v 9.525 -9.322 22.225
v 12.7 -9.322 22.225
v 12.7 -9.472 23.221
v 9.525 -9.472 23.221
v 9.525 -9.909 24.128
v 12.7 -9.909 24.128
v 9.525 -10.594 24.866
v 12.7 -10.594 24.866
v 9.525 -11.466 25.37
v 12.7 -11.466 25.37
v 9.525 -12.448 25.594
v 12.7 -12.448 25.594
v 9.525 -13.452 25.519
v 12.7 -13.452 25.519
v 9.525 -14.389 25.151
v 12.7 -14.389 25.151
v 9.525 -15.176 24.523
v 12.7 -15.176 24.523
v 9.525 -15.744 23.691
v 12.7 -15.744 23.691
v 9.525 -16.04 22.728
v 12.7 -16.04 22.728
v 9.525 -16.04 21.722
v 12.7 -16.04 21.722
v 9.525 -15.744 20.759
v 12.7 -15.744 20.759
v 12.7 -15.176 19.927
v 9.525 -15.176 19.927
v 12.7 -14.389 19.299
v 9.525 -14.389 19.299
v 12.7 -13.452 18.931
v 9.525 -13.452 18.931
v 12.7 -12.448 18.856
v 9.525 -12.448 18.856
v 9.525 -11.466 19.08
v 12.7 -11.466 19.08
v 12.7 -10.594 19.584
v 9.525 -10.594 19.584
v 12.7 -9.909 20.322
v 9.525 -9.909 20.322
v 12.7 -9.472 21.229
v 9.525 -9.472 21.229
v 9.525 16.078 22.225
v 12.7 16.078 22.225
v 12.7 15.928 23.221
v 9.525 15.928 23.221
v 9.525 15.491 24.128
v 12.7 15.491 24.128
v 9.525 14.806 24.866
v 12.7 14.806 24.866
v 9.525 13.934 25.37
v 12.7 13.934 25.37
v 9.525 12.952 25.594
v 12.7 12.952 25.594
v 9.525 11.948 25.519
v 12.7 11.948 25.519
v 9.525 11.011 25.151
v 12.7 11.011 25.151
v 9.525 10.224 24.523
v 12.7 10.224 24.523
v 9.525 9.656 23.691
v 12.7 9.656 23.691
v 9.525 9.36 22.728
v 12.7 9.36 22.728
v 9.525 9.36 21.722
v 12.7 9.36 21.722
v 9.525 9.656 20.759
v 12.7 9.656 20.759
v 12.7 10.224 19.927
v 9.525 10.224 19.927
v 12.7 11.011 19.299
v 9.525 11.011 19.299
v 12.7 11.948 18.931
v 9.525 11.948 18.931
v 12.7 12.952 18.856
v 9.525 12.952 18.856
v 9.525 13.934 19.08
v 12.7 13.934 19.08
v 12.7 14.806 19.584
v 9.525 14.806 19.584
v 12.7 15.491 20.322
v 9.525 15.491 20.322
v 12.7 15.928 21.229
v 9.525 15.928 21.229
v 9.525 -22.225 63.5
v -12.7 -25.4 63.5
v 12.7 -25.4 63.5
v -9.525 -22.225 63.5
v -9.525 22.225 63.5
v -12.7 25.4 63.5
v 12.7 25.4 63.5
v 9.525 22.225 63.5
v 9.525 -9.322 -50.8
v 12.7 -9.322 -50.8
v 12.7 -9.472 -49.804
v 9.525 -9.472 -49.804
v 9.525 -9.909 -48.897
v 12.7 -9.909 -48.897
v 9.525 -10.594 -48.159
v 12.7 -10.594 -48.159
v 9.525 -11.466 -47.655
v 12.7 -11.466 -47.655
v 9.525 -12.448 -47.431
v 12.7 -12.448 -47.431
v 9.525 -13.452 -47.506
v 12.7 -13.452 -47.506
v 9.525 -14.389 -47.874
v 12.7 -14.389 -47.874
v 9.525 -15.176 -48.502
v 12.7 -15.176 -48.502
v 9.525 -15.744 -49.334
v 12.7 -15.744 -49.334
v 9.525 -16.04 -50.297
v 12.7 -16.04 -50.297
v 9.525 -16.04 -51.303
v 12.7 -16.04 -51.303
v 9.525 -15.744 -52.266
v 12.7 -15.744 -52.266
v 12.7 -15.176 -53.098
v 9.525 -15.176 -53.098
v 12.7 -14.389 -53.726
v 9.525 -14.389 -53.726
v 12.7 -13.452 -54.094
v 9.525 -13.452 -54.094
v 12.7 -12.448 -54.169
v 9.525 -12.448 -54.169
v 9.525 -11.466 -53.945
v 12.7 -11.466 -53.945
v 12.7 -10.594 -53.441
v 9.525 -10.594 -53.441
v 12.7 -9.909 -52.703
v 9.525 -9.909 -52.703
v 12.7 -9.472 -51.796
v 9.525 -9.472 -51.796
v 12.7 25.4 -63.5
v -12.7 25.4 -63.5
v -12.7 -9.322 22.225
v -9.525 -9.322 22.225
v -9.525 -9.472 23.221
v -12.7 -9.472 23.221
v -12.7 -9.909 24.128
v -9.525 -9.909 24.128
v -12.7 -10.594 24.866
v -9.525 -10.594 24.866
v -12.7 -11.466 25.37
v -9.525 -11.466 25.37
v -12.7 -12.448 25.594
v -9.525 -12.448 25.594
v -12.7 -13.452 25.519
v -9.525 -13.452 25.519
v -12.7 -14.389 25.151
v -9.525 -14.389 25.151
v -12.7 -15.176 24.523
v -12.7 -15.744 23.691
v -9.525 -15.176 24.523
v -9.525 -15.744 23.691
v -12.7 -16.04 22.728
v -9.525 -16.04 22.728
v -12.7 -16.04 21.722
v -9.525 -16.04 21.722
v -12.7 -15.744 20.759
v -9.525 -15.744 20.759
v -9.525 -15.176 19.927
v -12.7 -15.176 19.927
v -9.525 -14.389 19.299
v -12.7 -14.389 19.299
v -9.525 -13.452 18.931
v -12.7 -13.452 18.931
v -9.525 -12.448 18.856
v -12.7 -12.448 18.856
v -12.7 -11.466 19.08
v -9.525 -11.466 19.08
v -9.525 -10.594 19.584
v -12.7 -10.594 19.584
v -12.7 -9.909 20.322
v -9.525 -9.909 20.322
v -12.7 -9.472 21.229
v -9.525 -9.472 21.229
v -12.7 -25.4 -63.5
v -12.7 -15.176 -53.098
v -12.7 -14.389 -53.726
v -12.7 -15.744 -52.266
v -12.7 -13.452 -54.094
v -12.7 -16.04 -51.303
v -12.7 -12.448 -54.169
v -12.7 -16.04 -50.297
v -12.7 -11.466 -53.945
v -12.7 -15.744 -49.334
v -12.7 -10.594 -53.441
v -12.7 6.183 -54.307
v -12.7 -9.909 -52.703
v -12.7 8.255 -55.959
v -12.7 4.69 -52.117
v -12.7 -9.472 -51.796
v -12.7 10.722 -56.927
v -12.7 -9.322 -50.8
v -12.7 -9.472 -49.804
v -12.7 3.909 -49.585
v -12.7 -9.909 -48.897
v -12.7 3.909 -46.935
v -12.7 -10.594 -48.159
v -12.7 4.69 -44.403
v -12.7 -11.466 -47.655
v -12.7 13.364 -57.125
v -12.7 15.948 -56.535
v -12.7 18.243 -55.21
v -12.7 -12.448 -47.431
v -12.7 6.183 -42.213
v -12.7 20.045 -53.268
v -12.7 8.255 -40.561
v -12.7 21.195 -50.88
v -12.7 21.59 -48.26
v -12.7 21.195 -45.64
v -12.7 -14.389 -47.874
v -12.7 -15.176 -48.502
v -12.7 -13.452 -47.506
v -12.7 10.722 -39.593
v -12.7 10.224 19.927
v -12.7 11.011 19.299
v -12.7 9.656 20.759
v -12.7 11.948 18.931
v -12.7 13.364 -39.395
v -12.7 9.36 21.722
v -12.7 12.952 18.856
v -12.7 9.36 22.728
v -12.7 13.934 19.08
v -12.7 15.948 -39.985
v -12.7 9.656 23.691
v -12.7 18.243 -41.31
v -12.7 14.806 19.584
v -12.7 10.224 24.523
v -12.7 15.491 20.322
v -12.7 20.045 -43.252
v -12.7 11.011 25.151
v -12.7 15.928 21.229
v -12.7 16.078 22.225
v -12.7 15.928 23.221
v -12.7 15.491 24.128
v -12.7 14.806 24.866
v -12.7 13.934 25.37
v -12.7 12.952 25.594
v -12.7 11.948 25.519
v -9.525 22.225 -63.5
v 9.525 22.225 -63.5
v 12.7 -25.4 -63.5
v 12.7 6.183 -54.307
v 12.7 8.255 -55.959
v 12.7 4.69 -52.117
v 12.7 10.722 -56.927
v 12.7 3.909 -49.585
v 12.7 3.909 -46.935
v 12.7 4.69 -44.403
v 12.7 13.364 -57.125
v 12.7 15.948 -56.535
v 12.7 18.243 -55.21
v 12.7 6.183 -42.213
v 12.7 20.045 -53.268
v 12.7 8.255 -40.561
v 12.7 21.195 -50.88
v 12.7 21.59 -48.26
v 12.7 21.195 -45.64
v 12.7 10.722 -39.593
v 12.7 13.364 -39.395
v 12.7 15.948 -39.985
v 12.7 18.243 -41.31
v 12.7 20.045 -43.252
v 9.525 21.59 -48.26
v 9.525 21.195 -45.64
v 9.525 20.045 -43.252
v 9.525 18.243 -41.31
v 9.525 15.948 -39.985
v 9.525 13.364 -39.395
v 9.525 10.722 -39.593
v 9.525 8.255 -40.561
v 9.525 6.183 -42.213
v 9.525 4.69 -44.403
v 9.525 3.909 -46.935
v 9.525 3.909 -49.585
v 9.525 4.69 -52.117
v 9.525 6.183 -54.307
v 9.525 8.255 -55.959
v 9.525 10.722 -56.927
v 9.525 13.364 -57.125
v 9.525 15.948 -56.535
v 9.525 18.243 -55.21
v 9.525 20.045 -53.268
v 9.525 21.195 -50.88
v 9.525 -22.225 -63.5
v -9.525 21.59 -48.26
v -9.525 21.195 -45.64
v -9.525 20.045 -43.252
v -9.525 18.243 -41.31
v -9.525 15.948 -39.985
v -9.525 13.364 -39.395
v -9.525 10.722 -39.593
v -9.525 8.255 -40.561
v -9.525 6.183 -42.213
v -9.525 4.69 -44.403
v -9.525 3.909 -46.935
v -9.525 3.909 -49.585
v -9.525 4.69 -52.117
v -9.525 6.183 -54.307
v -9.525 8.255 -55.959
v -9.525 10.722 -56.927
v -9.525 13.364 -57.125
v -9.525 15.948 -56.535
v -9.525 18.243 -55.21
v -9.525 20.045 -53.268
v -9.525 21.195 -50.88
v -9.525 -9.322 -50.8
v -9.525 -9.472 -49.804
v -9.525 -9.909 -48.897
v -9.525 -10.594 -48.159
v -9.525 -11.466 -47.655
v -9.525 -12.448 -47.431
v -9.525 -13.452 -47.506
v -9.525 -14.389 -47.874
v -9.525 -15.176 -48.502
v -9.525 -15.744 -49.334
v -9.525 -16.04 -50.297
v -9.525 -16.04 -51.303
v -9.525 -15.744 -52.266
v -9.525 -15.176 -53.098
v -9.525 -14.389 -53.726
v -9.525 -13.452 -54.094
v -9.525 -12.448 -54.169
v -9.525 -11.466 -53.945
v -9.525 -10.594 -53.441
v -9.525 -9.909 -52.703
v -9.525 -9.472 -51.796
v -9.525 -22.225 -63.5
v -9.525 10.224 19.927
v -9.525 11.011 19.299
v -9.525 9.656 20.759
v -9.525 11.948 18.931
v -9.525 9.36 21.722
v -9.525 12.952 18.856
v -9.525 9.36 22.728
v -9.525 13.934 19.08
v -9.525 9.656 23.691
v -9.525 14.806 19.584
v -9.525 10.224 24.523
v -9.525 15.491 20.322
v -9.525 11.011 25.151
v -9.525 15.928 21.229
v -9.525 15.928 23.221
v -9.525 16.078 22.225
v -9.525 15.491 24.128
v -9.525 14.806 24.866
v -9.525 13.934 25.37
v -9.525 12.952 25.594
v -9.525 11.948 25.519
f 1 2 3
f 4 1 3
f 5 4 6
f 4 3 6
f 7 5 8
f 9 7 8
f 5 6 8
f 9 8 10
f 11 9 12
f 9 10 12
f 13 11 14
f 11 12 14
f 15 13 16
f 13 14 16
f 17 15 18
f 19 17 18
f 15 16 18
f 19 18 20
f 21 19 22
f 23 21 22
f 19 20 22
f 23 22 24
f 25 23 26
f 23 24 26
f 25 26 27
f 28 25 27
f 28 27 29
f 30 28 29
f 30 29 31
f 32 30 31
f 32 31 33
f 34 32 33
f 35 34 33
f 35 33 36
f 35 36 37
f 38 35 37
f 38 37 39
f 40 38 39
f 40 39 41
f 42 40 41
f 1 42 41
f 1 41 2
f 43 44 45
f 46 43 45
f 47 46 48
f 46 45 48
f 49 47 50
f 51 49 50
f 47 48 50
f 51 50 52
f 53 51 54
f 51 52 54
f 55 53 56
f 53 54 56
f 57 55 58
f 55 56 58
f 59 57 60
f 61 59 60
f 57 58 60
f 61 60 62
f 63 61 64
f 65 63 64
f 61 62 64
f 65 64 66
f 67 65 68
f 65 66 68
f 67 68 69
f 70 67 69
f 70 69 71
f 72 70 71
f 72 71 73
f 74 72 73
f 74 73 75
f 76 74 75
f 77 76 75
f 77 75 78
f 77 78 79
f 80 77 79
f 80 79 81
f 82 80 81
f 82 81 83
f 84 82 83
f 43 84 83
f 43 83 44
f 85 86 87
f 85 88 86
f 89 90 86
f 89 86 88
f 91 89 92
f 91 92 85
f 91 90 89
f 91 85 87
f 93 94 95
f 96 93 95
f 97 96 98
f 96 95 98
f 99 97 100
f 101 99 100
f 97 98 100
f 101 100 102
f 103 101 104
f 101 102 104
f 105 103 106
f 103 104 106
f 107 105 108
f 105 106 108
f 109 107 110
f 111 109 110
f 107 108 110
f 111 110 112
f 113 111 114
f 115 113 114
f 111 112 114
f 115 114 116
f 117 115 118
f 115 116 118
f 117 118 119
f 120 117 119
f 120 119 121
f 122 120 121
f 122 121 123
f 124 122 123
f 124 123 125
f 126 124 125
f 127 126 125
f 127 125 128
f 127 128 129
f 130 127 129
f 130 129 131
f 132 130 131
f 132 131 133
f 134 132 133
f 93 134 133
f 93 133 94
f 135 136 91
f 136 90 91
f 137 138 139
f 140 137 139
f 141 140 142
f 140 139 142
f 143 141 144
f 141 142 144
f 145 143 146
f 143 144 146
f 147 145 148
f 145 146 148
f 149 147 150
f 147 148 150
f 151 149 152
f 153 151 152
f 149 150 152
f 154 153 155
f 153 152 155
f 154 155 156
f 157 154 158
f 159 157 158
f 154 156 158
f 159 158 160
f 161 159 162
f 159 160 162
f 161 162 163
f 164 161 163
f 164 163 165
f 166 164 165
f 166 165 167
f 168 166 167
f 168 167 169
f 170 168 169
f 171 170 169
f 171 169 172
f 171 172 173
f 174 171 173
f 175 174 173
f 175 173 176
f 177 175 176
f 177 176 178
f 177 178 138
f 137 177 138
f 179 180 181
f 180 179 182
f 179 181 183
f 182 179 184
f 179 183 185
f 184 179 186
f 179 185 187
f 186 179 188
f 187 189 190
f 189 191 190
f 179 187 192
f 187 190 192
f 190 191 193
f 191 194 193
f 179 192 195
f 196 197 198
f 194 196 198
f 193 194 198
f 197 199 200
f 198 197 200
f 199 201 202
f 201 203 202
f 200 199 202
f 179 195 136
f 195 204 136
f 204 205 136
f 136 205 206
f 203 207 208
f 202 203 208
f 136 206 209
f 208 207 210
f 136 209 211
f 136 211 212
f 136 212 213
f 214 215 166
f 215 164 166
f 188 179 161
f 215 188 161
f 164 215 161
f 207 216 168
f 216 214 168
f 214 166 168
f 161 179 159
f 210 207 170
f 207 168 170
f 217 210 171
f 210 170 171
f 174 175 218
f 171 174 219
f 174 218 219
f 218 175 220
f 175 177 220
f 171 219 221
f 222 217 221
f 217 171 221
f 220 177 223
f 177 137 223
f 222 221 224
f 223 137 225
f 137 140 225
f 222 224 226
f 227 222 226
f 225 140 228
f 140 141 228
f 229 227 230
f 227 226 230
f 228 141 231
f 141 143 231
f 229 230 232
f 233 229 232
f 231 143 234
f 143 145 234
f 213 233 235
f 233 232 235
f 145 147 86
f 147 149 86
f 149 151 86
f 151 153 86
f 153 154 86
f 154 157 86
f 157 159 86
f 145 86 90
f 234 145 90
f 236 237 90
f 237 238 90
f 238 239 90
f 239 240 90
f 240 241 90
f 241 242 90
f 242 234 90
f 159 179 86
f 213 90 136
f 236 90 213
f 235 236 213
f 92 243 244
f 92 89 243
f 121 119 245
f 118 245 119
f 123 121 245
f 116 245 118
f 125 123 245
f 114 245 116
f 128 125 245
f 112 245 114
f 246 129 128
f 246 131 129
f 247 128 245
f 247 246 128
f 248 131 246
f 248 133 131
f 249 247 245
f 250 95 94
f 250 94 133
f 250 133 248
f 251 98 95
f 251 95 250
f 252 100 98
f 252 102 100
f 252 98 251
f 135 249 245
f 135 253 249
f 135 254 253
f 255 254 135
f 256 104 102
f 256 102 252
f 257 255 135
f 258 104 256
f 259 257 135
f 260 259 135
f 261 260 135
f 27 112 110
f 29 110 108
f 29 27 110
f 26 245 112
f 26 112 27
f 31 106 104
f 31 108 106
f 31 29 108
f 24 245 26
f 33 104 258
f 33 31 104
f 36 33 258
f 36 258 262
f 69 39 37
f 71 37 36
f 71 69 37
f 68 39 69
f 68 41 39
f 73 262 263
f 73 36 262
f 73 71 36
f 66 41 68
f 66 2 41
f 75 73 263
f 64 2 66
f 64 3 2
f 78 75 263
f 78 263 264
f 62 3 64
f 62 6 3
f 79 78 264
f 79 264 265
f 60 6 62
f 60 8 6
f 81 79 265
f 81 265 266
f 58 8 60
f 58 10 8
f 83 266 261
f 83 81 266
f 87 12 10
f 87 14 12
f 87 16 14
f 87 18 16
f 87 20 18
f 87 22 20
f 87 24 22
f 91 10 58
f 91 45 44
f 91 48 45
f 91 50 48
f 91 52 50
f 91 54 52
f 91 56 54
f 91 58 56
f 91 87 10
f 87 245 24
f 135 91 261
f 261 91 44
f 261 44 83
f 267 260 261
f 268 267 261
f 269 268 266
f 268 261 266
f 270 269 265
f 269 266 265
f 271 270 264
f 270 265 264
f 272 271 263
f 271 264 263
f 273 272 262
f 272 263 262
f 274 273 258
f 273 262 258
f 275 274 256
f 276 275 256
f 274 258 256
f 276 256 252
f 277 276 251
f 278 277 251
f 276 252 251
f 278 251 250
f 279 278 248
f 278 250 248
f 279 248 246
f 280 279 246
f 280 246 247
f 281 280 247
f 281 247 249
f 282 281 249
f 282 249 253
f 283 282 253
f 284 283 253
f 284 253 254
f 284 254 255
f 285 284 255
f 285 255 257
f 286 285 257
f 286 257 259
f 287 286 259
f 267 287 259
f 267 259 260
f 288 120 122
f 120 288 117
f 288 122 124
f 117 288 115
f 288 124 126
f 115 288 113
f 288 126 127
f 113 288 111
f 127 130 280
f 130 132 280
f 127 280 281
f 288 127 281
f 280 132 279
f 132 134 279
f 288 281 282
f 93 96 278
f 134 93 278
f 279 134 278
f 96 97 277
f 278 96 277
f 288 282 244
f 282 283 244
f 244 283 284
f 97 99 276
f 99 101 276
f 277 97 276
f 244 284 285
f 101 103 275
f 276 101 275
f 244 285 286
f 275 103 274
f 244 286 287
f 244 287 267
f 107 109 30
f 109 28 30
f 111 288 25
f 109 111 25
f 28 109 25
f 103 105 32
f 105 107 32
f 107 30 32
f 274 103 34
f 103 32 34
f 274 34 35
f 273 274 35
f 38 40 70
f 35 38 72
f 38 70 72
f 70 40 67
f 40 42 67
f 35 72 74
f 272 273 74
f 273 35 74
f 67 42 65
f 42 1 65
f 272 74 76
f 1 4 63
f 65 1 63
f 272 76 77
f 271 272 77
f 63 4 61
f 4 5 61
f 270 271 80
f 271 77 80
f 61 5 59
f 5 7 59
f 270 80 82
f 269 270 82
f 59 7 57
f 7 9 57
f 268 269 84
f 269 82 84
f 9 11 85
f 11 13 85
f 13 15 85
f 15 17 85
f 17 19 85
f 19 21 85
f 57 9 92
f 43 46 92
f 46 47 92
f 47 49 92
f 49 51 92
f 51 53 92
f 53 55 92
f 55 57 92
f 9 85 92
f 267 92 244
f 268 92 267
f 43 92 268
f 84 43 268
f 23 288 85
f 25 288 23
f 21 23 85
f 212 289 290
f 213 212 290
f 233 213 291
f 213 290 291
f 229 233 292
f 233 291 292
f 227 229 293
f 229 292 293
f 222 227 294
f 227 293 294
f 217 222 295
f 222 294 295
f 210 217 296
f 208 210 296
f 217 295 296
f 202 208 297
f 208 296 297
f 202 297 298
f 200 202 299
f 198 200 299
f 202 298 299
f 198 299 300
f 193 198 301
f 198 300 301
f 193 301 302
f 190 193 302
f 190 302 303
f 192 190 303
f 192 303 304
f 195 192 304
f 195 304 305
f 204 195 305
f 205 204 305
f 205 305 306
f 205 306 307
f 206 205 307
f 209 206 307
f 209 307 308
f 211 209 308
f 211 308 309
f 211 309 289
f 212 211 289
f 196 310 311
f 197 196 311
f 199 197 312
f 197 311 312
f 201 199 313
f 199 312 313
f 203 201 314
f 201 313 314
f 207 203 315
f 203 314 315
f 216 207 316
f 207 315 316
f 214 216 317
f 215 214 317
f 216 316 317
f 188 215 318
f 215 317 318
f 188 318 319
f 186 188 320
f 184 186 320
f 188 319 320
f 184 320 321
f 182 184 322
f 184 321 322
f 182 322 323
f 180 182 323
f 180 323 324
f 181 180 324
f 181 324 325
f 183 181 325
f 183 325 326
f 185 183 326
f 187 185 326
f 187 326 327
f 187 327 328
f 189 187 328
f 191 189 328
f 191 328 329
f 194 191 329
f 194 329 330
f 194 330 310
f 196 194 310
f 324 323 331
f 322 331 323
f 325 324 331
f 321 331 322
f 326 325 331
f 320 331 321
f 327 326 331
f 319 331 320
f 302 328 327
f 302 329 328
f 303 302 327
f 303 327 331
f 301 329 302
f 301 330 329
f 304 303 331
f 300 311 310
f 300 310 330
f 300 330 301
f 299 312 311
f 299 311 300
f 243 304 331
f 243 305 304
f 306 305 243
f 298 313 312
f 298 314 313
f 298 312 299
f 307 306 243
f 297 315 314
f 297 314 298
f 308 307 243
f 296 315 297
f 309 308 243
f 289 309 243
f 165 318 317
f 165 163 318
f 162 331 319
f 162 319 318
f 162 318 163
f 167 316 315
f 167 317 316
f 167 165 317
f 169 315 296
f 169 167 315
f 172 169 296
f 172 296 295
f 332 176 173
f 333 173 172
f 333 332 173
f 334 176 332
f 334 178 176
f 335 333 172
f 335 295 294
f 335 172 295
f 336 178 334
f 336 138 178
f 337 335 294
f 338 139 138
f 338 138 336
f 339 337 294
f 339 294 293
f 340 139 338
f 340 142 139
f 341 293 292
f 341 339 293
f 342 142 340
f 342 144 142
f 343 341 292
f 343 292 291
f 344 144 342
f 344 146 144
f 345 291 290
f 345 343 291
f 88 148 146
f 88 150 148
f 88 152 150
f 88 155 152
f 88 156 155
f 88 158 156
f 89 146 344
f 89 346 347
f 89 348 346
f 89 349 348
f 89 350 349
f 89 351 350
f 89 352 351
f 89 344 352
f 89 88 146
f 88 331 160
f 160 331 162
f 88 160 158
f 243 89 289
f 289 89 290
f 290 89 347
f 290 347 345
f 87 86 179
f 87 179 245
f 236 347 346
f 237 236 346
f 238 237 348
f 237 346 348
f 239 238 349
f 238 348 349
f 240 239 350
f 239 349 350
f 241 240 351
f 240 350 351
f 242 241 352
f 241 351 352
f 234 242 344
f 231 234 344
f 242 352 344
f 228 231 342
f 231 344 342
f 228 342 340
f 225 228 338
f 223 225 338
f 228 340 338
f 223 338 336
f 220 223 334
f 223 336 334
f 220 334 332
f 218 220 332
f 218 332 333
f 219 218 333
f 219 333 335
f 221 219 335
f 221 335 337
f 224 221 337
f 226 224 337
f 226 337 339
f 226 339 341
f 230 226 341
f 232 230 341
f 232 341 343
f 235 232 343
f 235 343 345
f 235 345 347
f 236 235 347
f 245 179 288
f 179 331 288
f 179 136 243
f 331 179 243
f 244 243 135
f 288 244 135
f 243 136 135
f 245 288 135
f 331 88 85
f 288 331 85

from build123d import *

# Parameters (mm, degrees)
SKETCH1_W           = 25.4
SKETCH1_H           = 50.8
SKETCH1_W_2         = 19.05
SKETCH1_H_2         = 44.45
BOSS_EXTRUDE1_DEPTH = 63.5
SKETCH2_R           = 3.3782
CUT_EXTRUDE3_DEPTH  = 73.955945611
SKETCH3_R           = 8.89
CUT_EXTRUDE4_DEPTH  = 73.955945611


with BuildPart() as part:
    # Sketch1 → Boss-Extrude1 (new, symmetric)
    with BuildSketch(Plane.XY):
        Rectangle(SKETCH1_W, SKETCH1_H)
        Rectangle(SKETCH1_W_2, SKETCH1_H_2, mode=Mode.SUBTRACT)
    extrude(amount=BOSS_EXTRUDE1_DEPTH, both=True)

    # Sketch2 → Cut-Extrude3 (cut, through all)
    with BuildSketch(Plane(origin=(12.7, 0, 0), x_dir=(0, 0, -1), z_dir=(1, 0, 0))):
        with Locations(Location((-22.225, 12.7, 0), (0, 0, 90))):
            Circle(SKETCH2_R)
        with Locations(Location((-22.225, -12.7, 0), (0, 0, 90))):
            Circle(SKETCH2_R)
        with Locations(Location((50.8, -12.7, 0), (0, 0, 90))):
            Circle(SKETCH2_R)
    extrude(amount=-CUT_EXTRUDE3_DEPTH, mode=Mode.SUBTRACT)

    # Sketch3 → Cut-Extrude4 (cut, through all)
    with BuildSketch(Plane(origin=(12.7, 0, 0), x_dir=(0, 0, -1), z_dir=(1, 0, 0))):
        with Locations(Location((48.26, 12.7, 0), (0, 0, 90))):
            Circle(SKETCH3_R)
    extrude(amount=-CUT_EXTRUDE4_DEPTH, mode=Mode.SUBTRACT)


solid = part.part
